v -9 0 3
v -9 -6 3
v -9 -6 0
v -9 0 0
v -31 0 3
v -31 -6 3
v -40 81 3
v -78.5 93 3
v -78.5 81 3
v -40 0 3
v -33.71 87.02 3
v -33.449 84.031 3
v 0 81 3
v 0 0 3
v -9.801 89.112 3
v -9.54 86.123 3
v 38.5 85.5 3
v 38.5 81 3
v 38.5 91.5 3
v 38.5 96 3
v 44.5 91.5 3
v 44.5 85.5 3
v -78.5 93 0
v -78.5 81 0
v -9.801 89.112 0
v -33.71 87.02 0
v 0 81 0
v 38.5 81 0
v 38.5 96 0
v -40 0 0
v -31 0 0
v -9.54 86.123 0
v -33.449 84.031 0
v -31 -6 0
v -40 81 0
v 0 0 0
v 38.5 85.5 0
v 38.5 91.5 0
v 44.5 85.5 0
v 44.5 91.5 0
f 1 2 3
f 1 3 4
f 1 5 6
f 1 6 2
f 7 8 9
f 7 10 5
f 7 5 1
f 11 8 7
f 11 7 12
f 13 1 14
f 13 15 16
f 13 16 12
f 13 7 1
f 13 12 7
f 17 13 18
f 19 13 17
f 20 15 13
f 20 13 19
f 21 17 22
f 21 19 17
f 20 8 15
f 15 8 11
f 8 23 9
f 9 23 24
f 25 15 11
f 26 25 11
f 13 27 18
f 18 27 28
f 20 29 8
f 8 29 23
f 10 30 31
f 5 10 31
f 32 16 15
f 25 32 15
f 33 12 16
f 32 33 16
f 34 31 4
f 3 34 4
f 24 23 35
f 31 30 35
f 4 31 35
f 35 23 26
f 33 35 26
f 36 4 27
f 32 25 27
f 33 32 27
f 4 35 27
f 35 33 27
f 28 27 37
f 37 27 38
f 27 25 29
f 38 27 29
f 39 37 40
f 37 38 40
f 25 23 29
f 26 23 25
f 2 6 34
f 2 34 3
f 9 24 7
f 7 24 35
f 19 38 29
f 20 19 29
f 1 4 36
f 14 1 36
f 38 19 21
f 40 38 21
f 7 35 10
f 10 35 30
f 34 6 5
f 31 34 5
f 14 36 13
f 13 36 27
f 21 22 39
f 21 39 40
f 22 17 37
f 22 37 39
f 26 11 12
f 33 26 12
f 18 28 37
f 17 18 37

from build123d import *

# Parameters (mm, degrees)
BOSS_EXTRUDE1_DEPTH = 3
CUT_EXTRUDE1_DEPTH  = 125.045354609
SKETCH3_W           = 6
SKETCH3_H           = 6
SKETCH3_W_2         = 22
BOSS_EXTRUDE2_DEPTH = 3


with BuildPart() as part:
    # Sketch1 → Boss-Extrude1 (new body)
    with BuildSketch(Plane.XY):
        Polygon((-78.5, 93), (-78.5, 81), (-40, 81), (-40, 0), (0, 0), (0, 81), (38.5, 81), (38.5, 96), align=None)
    extrude(amount=BOSS_EXTRUDE1_DEPTH)

    # Sketch2 → Cut-Extrude1 (cut, through all)
    with BuildSketch(Plane.XY.offset(3)):
        Polygon((-33.71, 87.02), (-33.448532772, 84.031415906), (-9.539860018, 86.123153732), (-9.801327246, 89.111737826), align=None)
    extrude(amount=-CUT_EXTRUDE1_DEPTH, mode=Mode.SUBTRACT)

    # Sketch3 → Boss-Extrude2 (add, through all)
    with BuildSketch(Plane.XY.offset(3)):
        with Locations((41.5, 88.5)):
            Rectangle(SKETCH3_W, SKETCH3_H)
        with Locations((-20, -3)):
            Rectangle(SKETCH3_W_2, SKETCH3_H)
    extrude(amount=-BOSS_EXTRUDE2_DEPTH)


solid = part.part
